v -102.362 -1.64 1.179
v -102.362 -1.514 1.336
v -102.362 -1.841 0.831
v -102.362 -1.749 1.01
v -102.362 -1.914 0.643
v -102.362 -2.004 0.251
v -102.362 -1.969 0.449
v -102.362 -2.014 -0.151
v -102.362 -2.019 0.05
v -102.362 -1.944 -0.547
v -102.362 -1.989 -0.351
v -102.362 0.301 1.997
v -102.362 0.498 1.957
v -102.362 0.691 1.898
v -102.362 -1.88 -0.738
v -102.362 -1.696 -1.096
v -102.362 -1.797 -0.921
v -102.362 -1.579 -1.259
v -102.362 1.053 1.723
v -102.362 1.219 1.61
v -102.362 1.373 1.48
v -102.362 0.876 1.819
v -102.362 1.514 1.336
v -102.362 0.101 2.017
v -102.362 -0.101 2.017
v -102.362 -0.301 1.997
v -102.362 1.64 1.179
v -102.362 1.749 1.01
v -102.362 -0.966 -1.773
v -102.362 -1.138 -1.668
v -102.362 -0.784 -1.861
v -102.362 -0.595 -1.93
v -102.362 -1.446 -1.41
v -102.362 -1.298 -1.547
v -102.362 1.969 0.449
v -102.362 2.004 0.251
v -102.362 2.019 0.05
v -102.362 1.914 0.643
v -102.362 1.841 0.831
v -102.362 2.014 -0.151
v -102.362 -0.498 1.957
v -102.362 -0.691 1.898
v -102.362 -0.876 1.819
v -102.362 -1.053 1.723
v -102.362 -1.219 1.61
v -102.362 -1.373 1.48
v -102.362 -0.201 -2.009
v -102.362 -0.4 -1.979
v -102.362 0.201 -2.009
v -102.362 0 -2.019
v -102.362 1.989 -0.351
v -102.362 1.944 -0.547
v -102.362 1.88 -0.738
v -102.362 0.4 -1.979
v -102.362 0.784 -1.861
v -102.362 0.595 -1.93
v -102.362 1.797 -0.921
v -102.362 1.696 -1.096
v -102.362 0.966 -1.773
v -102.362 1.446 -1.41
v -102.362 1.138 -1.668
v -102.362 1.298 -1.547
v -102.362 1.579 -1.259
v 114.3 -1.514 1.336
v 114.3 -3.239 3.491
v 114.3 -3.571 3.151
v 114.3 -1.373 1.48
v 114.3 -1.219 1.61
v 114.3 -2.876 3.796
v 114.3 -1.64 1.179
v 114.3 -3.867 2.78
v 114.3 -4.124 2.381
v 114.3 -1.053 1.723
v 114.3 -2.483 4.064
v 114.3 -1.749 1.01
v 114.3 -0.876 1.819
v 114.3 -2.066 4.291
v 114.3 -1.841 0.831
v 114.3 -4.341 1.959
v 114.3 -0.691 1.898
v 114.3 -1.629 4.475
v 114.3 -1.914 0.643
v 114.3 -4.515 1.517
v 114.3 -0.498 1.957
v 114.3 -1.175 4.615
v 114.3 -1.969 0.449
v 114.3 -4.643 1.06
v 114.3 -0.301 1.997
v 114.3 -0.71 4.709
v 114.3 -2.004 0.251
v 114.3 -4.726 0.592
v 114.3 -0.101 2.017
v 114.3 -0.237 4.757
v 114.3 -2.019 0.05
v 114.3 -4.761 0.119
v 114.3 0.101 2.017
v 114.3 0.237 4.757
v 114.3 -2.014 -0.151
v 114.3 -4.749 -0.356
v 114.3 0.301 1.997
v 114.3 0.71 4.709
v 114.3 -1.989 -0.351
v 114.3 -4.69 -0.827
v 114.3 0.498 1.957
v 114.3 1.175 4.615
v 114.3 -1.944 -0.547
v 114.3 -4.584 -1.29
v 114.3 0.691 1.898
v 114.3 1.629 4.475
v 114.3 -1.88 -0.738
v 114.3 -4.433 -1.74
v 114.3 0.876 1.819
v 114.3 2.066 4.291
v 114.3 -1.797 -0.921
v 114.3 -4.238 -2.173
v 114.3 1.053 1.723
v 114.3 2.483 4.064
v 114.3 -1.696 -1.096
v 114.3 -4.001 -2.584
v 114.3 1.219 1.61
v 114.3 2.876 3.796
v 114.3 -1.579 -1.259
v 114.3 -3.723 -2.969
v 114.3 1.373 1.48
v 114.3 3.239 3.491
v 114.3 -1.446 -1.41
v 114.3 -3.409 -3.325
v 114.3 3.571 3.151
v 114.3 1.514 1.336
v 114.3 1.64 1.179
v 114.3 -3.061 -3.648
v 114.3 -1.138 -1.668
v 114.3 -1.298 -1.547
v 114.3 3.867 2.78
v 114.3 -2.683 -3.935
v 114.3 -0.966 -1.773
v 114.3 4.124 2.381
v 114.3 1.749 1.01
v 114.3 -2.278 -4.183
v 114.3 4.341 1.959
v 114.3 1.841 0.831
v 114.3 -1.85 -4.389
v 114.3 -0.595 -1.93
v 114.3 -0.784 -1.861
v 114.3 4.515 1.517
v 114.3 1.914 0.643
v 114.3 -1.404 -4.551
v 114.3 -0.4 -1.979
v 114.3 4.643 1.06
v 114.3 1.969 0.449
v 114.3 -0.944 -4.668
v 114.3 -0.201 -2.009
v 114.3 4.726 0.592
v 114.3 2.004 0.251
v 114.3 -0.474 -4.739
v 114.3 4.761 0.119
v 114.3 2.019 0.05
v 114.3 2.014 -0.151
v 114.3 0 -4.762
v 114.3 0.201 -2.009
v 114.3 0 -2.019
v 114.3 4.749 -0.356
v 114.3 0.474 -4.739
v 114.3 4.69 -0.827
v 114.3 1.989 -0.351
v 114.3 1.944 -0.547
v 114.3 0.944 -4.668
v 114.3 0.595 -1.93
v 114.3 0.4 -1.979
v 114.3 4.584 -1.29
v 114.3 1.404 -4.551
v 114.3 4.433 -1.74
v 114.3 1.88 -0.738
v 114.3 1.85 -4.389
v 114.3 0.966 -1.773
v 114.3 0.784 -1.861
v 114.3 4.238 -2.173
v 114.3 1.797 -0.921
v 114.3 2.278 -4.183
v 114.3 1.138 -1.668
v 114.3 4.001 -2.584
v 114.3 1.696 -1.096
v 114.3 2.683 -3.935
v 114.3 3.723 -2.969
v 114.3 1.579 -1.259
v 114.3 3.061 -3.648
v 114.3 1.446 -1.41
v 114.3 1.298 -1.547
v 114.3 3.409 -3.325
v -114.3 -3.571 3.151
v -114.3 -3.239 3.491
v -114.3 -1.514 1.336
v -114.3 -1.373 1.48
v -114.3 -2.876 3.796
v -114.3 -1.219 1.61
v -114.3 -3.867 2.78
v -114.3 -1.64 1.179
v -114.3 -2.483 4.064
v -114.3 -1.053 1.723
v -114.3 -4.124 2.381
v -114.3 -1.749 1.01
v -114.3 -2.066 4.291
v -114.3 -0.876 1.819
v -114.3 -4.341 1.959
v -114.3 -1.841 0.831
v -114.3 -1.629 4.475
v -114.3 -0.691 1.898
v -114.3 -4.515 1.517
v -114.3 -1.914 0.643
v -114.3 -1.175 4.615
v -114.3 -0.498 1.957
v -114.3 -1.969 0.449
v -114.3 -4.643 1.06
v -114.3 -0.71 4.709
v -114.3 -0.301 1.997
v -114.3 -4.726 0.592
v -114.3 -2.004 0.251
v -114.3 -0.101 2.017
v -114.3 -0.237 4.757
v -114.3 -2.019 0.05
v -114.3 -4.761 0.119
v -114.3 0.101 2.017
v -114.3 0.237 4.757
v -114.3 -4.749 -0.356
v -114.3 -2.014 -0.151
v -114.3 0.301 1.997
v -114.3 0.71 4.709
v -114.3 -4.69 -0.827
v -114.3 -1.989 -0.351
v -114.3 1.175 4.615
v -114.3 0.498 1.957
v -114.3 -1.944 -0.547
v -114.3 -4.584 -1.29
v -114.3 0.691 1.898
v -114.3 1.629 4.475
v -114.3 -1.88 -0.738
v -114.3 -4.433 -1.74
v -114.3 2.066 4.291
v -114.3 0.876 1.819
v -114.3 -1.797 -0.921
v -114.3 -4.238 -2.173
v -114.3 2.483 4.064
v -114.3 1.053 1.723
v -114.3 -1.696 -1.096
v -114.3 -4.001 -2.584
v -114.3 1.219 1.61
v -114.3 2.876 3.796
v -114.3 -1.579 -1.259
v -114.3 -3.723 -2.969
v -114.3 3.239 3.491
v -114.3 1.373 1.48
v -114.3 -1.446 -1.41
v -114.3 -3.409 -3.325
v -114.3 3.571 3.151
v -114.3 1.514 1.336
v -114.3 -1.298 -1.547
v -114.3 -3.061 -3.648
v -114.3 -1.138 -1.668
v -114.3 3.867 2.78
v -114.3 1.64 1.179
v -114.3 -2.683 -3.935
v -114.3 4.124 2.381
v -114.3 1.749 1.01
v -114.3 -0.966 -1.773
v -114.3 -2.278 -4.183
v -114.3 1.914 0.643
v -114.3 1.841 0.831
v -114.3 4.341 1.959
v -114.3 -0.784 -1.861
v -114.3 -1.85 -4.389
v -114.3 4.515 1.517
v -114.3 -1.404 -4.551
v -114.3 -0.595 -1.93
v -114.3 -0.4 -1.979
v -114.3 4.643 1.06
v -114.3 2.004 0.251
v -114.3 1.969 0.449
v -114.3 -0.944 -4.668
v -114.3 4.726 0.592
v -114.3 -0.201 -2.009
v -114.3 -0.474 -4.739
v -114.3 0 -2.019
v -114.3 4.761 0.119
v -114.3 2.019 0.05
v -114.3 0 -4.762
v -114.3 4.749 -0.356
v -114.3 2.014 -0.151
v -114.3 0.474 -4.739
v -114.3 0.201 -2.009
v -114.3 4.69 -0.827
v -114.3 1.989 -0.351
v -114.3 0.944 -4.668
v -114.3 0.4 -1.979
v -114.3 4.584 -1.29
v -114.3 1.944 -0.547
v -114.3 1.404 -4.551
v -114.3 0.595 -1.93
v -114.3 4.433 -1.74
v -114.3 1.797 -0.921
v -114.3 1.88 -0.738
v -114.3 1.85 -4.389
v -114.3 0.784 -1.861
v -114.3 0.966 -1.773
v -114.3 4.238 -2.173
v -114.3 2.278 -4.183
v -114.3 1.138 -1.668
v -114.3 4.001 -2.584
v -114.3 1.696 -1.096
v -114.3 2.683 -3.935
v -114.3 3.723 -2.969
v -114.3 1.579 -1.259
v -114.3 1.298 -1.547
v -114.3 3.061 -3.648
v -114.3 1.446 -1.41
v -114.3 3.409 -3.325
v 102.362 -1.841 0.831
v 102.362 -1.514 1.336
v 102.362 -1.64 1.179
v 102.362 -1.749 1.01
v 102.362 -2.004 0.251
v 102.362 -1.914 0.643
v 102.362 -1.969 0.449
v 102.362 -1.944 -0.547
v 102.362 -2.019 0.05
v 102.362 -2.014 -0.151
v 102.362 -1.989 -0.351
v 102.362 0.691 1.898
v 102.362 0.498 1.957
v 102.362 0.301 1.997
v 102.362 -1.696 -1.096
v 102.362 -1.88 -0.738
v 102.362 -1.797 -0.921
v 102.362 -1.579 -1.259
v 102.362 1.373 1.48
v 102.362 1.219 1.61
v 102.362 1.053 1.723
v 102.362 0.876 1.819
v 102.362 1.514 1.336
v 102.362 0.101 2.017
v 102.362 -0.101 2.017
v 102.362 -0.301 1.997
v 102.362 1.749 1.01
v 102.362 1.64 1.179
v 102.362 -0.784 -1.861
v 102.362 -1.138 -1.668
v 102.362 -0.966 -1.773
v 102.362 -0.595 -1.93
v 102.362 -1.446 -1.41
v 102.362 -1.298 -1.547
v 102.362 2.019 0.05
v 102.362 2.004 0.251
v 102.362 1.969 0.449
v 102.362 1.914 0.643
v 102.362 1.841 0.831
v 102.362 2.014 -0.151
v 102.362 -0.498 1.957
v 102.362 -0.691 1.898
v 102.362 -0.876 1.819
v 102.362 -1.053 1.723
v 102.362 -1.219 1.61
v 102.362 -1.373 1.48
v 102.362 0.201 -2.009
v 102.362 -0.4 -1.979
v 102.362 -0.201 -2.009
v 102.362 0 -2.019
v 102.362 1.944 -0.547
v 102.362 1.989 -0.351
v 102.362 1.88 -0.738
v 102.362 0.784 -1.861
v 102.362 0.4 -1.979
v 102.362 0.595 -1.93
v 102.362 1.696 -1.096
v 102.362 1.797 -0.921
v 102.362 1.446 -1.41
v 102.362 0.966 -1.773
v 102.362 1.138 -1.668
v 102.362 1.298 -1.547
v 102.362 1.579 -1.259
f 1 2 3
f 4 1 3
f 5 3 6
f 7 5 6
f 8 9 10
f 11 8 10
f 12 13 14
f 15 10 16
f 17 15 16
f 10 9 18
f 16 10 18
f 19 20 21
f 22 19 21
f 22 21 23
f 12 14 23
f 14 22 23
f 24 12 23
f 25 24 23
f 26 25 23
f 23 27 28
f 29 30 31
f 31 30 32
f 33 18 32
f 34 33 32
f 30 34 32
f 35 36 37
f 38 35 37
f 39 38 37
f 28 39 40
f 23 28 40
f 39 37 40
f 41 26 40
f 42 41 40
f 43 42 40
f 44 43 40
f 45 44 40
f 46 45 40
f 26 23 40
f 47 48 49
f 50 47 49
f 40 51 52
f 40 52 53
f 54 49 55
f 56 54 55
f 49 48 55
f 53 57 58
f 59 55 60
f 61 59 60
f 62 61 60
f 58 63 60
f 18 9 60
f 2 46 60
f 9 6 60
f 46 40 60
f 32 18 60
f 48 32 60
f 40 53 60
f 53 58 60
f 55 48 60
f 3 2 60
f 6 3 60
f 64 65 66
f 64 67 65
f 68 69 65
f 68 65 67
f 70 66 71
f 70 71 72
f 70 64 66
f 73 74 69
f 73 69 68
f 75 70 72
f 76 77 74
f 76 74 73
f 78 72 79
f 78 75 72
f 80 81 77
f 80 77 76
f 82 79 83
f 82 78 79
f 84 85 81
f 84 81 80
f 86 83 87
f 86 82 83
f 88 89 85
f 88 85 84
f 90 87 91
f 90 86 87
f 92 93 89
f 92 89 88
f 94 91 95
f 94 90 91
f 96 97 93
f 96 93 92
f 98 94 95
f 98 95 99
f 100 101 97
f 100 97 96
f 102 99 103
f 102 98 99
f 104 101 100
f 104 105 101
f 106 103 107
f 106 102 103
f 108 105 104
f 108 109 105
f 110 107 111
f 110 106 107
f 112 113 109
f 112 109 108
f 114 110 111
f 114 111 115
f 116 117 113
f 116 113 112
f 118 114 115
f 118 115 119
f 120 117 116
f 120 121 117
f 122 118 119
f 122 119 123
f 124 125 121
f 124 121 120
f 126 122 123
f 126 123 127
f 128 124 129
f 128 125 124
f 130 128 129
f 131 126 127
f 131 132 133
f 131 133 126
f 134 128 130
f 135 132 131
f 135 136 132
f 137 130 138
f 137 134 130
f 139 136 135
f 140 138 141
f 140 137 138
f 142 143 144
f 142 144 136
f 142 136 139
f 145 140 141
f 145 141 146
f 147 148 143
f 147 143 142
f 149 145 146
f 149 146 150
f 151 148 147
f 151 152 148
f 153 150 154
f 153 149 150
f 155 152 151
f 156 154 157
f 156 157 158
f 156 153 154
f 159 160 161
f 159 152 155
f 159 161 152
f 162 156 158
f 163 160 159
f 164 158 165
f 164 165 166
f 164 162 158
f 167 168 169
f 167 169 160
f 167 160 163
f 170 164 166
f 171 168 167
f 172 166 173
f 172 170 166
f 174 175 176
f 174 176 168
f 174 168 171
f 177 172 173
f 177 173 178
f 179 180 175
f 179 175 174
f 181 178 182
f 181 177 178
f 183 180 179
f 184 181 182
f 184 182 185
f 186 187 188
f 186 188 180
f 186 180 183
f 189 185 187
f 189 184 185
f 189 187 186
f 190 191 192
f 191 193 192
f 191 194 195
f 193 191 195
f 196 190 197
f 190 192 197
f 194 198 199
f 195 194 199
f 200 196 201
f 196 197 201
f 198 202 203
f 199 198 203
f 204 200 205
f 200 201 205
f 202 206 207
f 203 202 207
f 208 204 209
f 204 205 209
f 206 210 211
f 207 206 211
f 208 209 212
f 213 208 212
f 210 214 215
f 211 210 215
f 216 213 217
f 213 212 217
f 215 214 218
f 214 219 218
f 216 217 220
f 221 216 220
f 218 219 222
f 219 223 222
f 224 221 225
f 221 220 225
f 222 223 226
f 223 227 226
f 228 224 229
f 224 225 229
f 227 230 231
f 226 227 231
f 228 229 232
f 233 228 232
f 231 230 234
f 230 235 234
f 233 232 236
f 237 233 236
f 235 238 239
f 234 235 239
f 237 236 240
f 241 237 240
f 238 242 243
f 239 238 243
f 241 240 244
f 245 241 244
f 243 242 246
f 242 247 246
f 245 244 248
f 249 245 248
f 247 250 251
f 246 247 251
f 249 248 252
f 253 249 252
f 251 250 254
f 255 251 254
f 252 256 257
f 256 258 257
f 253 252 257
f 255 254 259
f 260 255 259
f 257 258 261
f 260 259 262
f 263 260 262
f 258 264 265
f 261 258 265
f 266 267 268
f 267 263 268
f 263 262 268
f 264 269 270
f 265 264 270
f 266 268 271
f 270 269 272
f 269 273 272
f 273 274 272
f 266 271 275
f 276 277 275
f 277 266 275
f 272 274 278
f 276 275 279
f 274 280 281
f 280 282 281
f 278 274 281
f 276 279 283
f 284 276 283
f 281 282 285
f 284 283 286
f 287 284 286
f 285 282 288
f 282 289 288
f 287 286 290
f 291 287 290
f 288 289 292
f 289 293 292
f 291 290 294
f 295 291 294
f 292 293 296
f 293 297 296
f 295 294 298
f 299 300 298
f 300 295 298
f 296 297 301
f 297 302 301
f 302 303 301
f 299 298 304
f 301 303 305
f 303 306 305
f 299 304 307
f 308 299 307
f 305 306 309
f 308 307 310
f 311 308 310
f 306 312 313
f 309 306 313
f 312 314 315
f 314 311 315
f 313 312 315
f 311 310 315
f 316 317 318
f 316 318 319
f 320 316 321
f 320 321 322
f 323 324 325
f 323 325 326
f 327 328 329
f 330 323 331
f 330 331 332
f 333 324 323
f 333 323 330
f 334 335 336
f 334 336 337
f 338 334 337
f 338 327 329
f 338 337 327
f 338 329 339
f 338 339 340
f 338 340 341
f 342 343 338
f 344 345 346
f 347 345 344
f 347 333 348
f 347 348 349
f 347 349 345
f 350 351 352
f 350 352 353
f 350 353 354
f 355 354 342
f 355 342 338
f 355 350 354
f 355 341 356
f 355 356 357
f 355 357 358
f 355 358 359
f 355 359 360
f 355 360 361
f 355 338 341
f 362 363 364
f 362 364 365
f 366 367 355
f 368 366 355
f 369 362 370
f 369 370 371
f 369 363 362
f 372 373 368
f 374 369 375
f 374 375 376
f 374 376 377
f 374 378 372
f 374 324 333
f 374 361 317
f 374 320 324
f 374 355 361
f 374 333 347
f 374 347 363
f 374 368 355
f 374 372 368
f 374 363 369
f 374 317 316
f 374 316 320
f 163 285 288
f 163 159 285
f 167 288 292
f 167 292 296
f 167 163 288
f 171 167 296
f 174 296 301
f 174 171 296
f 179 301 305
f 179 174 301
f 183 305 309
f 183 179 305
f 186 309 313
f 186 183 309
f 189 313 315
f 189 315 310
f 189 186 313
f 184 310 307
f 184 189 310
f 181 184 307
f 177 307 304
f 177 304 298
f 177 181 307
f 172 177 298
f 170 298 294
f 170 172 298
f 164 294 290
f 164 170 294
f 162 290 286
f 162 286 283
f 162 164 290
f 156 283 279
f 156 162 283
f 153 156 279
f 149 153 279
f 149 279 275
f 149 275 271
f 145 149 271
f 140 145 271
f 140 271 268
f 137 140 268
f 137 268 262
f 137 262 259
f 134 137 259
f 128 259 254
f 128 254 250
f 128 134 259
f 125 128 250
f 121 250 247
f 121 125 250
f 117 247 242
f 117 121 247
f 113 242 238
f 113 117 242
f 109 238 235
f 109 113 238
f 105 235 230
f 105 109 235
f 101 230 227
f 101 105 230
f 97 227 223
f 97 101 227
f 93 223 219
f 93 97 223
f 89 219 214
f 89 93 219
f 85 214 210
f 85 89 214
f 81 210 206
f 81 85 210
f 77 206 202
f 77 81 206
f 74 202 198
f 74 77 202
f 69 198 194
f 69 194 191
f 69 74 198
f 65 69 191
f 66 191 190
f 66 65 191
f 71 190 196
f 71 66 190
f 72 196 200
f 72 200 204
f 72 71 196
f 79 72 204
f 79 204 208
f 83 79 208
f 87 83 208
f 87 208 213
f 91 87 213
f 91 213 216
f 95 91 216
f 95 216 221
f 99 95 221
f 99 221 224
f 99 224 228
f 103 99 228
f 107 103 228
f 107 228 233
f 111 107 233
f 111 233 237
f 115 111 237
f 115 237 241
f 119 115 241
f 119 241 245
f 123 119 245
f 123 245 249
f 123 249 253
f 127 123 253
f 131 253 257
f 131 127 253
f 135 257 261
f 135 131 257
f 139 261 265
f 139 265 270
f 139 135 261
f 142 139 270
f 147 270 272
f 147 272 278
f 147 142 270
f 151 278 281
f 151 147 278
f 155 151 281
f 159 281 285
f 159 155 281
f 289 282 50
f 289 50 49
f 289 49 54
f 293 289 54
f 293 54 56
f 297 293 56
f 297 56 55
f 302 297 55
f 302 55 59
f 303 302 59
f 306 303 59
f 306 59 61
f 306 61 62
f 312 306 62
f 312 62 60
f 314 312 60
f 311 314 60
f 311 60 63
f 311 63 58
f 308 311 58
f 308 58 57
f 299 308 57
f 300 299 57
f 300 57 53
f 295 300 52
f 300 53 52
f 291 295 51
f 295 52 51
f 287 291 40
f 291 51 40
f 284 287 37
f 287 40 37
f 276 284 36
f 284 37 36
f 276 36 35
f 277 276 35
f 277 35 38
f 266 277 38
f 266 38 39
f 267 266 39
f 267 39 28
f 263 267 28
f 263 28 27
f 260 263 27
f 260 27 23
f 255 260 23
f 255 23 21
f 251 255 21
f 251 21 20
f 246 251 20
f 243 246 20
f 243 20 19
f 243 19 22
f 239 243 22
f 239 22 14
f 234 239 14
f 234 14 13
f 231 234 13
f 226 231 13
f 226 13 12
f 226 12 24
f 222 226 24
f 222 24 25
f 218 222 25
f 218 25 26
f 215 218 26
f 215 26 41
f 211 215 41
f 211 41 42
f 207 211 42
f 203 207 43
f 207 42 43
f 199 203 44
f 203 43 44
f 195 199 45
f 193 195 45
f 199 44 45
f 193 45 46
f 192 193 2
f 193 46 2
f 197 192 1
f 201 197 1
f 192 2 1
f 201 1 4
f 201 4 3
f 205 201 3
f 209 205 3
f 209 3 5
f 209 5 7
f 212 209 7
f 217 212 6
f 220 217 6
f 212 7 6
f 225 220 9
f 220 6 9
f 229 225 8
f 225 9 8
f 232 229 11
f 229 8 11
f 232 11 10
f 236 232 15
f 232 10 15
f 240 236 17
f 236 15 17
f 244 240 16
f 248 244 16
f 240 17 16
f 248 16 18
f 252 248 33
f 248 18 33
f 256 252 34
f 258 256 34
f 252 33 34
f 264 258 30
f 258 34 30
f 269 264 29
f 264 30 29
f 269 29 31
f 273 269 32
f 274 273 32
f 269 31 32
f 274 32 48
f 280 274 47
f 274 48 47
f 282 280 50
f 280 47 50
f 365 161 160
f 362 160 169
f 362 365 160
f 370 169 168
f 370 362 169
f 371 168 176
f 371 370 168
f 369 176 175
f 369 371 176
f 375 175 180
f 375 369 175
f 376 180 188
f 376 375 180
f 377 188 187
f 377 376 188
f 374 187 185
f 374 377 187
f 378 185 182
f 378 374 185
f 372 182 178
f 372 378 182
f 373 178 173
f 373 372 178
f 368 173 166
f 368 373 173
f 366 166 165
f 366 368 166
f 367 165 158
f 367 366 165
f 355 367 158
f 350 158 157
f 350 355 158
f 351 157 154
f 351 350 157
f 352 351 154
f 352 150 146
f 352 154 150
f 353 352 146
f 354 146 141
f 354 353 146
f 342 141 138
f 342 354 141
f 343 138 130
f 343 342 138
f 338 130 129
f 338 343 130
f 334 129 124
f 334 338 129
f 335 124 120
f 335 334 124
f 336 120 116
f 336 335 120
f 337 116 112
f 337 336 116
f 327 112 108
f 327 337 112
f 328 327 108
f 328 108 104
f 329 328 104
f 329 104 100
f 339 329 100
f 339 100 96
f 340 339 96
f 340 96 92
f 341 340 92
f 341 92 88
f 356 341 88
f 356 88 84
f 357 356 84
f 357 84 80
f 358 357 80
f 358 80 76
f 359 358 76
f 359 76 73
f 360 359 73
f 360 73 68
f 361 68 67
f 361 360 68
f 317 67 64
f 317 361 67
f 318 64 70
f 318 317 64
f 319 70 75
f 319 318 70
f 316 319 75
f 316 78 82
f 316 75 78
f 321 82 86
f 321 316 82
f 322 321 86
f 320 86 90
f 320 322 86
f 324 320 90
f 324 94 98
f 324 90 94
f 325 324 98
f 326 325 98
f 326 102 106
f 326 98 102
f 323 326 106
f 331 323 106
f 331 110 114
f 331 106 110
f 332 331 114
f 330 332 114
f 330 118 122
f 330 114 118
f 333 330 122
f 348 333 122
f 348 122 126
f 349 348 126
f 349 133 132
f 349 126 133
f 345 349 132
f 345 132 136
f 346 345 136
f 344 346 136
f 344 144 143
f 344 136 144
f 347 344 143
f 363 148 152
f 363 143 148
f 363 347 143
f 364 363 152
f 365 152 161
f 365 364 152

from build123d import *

# Parameters (mm, degrees)
SKETCH1_R                  = 4.7625
BOSS_EXTRUDE1_DEPTH        = 114.3
F_10_32_TAPPED_HOLE1_D     = 4.0386
F_10_32_TAPPED_HOLE1_DEPTH = 11.938


with BuildPart() as part:
    # Sketch1 → Boss-Extrude1 (new body, symmetric)
    with BuildSketch(Plane(origin=(0, 0, 0), x_dir=(0, 0, -1), z_dir=(1, 0, 0))):
        Circle(SKETCH1_R)
    extrude(amount=BOSS_EXTRUDE1_DEPTH, both=True)

    # #10-32 Tapped Hole1
    with Locations(Plane.ZY.offset(114.3)):
        with Locations((0, 0)):
            f_10_32_tapped_hole1 = Hole(F_10_32_TAPPED_HOLE1_D / 2, depth=F_10_32_TAPPED_HOLE1_DEPTH)

    # Mirror1: #10-32 Tapped Hole1 across plane
    add(f_10_32_tapped_hole1.mirror(Plane(origin=(0, 0, 0), x_dir=(0, 0, 1), z_dir=(1, 0, 0))), mode=Mode.SUBTRACT)


solid = part.part
